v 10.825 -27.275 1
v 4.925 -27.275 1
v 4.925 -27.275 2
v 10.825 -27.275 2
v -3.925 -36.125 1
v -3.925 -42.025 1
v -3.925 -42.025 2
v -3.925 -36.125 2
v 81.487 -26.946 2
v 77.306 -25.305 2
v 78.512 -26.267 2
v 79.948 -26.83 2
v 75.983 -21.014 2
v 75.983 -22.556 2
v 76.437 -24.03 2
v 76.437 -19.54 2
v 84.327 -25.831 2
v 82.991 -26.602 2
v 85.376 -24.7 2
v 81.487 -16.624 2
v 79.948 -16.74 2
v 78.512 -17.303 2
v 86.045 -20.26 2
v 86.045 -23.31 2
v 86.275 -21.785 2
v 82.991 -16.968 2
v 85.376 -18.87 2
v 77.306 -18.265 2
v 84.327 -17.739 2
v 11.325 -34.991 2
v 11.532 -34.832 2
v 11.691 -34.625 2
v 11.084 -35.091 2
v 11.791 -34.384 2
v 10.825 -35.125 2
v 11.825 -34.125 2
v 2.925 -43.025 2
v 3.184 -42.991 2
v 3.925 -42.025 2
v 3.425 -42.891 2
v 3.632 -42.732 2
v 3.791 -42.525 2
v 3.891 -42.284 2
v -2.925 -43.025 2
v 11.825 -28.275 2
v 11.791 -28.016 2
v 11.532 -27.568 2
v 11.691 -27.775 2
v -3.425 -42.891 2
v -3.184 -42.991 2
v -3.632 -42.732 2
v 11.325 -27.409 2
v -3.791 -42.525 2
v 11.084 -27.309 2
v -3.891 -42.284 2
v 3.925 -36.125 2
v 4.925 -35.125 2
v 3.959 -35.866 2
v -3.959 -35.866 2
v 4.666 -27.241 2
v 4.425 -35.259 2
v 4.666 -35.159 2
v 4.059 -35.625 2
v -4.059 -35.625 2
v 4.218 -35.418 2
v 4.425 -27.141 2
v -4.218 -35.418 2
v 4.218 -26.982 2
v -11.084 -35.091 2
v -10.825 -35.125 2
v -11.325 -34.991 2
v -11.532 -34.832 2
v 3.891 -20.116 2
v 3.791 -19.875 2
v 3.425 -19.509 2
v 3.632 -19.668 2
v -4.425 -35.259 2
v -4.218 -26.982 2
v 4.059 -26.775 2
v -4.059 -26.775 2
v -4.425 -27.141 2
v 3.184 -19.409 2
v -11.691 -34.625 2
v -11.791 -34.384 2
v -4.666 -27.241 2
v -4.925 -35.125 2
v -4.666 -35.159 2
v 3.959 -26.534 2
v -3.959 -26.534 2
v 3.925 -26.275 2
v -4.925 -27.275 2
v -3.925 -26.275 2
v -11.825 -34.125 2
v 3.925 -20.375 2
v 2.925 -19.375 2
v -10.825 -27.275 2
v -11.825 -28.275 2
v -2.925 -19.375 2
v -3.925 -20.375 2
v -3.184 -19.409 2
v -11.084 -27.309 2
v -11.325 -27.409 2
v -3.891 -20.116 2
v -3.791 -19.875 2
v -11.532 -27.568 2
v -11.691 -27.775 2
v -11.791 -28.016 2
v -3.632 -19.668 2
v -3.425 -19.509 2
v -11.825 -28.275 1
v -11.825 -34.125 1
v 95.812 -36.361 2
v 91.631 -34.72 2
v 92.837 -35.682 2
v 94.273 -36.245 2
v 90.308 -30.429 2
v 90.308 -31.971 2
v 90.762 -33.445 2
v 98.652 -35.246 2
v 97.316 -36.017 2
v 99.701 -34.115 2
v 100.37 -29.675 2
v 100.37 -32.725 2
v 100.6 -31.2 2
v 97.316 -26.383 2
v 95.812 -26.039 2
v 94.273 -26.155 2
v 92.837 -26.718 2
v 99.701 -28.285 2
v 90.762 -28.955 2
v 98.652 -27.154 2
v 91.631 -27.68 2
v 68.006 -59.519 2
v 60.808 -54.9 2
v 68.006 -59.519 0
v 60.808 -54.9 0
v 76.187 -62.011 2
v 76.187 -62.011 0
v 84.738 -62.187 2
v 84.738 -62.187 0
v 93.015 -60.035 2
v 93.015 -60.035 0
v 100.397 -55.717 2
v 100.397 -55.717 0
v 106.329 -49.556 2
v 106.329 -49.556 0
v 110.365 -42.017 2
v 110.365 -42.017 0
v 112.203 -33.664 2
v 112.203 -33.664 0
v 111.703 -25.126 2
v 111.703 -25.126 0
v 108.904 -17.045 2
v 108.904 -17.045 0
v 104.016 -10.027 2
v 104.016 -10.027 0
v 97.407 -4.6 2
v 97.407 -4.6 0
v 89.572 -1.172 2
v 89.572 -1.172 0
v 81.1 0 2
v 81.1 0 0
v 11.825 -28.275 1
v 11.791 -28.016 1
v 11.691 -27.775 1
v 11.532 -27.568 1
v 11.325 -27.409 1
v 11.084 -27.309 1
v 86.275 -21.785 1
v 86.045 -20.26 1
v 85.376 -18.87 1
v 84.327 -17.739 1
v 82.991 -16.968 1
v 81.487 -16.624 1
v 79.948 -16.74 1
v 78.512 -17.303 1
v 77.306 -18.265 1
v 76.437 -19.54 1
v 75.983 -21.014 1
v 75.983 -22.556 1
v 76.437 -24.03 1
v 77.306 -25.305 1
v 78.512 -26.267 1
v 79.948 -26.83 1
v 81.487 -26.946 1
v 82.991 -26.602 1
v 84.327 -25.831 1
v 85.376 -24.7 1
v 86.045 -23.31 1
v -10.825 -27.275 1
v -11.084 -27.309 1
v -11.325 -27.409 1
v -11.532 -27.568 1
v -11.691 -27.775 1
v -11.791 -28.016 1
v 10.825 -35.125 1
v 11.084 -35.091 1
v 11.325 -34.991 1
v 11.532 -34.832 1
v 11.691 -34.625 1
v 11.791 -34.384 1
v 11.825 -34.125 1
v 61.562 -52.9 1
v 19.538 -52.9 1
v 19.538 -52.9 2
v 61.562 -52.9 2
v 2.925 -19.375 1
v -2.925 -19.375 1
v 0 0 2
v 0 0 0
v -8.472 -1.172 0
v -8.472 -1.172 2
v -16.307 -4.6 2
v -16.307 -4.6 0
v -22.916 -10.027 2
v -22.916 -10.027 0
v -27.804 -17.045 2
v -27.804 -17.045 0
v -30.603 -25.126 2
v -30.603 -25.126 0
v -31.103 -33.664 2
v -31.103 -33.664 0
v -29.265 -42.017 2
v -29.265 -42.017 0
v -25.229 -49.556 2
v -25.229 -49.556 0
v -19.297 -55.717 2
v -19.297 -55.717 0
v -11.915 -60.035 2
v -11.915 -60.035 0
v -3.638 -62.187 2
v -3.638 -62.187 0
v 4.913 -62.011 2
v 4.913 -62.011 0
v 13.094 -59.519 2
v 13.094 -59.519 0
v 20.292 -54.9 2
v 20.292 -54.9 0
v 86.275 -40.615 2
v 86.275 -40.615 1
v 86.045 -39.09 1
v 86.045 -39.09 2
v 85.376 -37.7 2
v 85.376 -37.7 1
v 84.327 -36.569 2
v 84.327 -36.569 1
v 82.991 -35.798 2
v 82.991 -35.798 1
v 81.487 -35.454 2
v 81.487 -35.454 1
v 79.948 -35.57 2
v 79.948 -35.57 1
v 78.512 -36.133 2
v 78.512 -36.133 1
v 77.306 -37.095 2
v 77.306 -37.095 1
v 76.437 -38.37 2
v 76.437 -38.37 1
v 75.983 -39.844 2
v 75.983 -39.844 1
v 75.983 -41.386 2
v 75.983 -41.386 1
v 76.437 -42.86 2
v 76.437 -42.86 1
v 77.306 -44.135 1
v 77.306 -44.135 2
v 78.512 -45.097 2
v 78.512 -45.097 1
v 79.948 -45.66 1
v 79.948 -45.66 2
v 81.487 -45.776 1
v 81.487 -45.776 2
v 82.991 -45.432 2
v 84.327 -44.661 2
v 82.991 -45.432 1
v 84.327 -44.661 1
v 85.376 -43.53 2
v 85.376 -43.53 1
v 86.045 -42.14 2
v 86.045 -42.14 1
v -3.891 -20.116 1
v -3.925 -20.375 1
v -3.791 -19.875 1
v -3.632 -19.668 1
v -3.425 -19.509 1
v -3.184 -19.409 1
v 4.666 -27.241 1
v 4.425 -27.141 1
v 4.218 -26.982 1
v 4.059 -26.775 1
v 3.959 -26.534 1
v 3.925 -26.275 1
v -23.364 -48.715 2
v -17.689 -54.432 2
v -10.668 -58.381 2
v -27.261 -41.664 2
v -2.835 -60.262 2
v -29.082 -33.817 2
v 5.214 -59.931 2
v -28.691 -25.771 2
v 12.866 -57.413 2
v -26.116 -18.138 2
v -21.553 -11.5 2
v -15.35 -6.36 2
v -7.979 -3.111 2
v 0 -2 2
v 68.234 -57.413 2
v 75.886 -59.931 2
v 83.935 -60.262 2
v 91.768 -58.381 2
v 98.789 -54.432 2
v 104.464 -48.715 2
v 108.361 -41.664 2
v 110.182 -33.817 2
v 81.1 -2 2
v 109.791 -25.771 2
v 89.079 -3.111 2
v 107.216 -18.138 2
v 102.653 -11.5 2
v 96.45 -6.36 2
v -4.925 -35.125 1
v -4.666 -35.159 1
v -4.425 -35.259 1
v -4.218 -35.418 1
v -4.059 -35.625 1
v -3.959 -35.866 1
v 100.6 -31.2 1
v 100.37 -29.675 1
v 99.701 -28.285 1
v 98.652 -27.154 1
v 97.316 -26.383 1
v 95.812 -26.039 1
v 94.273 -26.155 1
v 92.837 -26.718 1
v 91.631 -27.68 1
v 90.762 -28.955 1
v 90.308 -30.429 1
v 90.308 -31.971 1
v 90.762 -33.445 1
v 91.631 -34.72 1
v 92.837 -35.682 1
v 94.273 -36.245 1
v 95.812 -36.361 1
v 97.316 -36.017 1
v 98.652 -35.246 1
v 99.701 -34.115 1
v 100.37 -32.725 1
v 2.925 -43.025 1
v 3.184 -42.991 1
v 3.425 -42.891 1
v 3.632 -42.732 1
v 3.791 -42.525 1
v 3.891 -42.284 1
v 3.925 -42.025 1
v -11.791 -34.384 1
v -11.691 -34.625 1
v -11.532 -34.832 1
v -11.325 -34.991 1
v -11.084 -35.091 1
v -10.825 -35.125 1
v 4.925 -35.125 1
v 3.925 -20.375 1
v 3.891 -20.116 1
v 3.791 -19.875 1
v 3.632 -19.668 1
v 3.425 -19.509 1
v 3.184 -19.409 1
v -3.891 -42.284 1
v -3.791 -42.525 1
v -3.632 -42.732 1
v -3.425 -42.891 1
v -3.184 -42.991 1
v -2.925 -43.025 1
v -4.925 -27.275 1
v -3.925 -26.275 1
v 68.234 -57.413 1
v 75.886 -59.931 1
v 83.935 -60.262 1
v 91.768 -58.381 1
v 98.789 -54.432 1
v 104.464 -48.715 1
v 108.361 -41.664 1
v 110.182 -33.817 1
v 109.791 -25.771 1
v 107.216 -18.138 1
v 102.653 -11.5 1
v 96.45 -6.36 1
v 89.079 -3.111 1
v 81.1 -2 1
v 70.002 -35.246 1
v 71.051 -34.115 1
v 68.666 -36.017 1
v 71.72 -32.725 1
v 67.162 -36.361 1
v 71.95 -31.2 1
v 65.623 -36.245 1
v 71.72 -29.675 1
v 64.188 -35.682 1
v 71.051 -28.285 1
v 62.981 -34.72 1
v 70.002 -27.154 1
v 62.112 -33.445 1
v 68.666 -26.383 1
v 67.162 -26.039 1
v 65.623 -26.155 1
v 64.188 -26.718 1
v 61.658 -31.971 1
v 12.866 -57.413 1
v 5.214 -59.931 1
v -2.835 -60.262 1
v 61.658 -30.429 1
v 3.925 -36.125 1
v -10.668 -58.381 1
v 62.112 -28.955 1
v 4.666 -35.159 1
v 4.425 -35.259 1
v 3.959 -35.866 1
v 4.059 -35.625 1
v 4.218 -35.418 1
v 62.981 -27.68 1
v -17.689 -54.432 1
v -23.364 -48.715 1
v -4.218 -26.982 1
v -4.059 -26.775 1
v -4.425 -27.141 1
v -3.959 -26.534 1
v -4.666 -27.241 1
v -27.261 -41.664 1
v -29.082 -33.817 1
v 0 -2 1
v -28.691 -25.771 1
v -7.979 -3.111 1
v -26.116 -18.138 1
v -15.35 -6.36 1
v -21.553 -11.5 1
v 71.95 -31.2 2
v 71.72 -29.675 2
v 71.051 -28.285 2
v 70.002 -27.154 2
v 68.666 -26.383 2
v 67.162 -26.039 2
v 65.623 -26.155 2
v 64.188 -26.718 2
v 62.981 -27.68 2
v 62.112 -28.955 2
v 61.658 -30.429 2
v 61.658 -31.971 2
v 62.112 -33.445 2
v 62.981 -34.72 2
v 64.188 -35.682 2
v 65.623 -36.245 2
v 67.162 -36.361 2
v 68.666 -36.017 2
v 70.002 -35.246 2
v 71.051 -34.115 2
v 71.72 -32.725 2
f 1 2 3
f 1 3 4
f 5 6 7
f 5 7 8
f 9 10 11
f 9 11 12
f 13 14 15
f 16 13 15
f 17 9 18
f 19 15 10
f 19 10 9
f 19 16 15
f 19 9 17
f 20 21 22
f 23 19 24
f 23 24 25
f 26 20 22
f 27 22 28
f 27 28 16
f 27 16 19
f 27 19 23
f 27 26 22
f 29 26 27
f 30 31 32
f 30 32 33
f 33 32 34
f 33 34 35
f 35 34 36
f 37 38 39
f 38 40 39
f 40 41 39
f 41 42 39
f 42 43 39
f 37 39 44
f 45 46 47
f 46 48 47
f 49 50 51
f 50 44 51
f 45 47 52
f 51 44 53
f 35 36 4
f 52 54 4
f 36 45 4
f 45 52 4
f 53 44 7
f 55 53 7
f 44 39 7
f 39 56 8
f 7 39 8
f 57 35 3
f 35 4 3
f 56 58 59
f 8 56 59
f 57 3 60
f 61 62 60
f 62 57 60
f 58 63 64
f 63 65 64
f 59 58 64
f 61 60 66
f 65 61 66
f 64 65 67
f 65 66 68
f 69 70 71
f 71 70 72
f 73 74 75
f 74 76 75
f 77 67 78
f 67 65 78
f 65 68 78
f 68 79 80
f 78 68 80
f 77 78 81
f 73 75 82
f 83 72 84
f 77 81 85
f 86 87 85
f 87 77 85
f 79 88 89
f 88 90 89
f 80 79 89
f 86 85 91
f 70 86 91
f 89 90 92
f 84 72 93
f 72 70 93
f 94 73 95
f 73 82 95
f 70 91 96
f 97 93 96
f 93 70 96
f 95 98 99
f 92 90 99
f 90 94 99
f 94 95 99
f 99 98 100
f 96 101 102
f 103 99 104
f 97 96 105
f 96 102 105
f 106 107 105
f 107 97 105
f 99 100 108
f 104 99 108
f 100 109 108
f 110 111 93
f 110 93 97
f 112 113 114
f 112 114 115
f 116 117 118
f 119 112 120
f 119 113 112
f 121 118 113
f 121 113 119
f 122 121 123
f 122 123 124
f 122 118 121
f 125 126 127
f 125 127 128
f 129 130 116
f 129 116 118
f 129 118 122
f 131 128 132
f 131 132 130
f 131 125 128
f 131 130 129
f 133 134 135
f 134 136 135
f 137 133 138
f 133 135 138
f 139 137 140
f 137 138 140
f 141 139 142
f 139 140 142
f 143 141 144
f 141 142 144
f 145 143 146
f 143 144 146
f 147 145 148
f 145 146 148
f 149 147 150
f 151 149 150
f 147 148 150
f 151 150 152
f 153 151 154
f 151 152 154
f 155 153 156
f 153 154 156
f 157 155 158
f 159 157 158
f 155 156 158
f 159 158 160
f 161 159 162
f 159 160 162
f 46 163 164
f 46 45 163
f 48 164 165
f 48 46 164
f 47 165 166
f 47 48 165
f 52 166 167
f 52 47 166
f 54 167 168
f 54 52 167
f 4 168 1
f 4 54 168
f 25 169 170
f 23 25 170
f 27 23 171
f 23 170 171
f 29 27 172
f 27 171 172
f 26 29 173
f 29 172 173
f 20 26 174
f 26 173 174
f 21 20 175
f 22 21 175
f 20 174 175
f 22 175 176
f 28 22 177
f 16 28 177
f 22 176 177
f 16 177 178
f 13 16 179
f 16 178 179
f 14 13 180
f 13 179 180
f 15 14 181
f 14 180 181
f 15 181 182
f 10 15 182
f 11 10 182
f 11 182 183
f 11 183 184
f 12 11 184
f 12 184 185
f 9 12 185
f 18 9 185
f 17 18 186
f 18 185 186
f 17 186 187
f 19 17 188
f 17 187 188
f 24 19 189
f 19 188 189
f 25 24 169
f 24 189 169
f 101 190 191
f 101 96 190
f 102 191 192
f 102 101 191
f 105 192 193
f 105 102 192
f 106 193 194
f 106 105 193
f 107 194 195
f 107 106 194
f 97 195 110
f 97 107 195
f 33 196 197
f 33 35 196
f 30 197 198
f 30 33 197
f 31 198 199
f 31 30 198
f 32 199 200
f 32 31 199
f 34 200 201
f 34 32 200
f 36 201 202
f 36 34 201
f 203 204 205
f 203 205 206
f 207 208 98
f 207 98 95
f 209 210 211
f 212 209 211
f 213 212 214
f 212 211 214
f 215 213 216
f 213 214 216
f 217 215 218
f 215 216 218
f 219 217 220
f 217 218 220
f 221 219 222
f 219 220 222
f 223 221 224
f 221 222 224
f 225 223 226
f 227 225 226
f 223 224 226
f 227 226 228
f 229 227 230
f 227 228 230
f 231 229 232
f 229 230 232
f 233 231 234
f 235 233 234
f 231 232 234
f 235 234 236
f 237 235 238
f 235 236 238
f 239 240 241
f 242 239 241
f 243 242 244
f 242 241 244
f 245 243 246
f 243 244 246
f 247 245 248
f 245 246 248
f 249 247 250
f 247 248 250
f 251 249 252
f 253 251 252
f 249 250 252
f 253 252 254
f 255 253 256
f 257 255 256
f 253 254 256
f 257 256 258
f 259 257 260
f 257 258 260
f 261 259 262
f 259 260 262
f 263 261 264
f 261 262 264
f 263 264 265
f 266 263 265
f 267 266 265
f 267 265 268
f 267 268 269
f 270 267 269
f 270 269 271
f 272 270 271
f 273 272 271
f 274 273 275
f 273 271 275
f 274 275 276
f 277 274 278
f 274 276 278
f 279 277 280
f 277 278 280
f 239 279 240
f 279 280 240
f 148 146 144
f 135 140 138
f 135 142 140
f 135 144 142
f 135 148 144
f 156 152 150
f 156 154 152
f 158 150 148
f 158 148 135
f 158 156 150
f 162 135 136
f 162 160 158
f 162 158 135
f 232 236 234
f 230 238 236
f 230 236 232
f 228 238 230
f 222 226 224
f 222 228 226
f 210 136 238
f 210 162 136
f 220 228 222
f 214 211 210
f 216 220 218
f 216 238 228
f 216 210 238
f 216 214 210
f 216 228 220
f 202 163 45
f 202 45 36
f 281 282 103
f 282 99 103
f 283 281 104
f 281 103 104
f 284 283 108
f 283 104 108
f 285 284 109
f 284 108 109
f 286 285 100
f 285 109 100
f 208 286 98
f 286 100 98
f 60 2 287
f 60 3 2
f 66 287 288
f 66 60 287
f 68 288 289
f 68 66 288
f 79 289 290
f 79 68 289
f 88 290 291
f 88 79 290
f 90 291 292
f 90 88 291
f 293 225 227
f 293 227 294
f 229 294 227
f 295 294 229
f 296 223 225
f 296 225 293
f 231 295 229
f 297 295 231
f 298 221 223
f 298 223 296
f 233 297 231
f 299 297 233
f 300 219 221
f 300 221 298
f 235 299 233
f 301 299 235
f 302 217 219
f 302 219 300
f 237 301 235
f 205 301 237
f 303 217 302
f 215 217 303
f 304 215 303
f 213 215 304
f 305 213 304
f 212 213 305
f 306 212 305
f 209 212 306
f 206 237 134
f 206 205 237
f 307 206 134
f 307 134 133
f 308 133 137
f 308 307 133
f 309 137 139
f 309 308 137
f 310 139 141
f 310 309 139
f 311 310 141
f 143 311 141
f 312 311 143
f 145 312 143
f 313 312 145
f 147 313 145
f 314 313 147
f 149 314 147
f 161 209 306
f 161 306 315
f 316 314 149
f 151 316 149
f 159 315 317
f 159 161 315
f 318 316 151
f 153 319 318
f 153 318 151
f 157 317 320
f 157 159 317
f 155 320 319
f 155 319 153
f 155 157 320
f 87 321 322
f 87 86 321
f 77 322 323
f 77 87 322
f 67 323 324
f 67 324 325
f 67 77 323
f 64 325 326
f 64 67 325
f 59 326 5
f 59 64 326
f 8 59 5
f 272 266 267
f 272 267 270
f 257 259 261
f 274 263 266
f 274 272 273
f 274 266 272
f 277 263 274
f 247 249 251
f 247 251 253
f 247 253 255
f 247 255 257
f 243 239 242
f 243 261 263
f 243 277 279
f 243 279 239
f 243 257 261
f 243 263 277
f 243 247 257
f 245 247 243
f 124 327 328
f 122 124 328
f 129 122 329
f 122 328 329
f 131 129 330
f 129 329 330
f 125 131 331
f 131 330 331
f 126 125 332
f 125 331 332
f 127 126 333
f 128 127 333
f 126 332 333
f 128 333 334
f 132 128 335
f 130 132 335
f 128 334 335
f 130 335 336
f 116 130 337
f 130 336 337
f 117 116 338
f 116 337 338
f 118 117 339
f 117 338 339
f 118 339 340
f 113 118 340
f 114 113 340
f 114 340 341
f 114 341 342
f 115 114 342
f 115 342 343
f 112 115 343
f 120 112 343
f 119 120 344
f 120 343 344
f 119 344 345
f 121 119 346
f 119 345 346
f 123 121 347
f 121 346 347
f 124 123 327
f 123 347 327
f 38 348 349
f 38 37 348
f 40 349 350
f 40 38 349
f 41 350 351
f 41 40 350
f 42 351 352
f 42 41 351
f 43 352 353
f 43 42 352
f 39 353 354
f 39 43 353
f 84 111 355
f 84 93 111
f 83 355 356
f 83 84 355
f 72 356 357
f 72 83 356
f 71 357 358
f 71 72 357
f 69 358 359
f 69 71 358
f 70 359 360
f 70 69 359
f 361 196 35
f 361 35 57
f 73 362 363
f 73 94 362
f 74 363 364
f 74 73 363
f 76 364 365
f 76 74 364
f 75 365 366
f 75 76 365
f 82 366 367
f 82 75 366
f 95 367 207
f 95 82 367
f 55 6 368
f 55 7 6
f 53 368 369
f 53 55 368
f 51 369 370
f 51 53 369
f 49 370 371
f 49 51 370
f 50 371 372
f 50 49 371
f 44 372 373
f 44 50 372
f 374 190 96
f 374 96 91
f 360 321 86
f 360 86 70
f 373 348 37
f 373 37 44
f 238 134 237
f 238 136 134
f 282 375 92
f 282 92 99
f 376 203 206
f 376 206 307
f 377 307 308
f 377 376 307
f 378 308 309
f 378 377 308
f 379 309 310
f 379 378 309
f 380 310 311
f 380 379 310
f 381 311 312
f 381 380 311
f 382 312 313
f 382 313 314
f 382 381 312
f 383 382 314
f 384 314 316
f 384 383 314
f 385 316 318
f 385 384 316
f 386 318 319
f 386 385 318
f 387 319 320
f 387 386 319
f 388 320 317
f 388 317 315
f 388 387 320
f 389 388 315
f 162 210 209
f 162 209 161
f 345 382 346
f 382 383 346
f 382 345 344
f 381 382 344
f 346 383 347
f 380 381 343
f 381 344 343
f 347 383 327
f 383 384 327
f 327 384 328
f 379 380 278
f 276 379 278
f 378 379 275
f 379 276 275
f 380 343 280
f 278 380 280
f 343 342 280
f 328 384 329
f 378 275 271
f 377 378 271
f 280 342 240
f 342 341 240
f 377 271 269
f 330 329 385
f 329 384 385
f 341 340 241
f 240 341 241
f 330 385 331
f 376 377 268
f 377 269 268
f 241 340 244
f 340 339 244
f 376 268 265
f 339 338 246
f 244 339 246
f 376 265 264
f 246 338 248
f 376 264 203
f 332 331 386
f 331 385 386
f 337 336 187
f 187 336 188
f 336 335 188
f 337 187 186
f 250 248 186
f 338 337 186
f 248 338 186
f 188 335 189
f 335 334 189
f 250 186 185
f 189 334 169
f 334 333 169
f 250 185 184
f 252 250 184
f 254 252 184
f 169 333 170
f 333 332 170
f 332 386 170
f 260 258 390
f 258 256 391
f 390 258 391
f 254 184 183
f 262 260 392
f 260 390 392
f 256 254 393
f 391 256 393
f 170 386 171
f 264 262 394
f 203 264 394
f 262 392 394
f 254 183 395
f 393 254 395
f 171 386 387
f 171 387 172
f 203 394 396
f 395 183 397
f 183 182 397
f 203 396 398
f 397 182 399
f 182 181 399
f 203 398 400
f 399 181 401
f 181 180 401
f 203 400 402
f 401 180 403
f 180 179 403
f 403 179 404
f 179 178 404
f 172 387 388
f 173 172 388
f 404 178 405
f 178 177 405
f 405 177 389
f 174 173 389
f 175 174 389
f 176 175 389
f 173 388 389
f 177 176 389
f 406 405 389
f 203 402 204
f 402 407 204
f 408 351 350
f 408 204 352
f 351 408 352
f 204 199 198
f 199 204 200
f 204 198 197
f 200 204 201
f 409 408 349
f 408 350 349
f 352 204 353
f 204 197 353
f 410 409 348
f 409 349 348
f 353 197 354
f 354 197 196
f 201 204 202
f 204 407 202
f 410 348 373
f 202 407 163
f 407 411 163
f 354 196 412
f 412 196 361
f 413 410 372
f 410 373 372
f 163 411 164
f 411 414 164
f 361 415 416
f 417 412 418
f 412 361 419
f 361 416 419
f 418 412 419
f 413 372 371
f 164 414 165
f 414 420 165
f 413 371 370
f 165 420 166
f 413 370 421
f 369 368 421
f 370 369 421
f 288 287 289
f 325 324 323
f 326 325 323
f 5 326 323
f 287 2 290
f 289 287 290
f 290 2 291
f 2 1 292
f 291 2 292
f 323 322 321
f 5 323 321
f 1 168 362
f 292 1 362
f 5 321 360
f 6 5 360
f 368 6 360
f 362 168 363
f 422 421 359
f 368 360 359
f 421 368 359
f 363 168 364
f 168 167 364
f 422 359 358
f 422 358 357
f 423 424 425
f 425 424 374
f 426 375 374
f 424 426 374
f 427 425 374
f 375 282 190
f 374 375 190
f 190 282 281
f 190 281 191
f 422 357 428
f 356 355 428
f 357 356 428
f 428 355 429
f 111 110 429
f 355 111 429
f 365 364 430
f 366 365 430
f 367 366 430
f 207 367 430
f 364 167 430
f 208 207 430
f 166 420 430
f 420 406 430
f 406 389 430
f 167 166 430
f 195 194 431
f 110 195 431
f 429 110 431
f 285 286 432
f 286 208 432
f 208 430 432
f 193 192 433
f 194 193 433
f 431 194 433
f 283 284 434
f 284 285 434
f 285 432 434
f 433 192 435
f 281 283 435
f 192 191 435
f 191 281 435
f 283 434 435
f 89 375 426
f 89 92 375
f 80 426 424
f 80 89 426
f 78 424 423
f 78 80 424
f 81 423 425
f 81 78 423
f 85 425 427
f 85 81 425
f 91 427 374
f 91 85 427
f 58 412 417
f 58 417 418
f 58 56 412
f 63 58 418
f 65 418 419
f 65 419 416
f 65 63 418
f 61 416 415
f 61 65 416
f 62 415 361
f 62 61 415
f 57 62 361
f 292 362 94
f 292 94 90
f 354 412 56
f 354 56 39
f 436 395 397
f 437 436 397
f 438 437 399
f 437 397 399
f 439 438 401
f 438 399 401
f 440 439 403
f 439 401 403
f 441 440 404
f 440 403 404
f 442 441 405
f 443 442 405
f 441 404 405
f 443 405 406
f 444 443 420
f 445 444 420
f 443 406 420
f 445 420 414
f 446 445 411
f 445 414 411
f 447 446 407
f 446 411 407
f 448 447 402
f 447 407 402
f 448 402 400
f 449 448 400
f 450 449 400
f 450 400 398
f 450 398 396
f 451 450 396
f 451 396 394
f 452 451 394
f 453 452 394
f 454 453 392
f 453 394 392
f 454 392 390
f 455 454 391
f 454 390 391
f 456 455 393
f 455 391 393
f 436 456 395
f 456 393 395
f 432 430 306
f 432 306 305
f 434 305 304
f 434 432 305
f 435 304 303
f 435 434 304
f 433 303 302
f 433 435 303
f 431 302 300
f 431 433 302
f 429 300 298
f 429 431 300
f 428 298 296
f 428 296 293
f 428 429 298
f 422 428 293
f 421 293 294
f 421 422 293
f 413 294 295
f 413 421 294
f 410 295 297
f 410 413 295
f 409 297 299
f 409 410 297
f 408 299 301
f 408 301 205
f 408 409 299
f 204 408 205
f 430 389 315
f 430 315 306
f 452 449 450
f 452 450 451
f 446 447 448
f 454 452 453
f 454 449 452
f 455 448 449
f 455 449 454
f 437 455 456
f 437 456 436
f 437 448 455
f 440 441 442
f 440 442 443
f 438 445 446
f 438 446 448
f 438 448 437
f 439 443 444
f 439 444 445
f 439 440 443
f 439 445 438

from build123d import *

# Parameters (mm, degrees)
PAD_DEPTH    = 1
SKETCH001_R  = 5.175
PAD001_DEPTH = 1
FILLET_R     = 1


with BuildPart() as part:
    # Sketch → Pad (new body)
    with BuildSketch(Plane.XY):
        with BuildLine():
            Line((0, 0), (81.1, 0))
            ThreePointArc((60.808376, -54.9), (110.364996, -42.016654), (81.1, 0))
            Line((20.291624, -54.9), (60.808376, -54.9))
            ThreePointArc((0, 0), (-29.264996, -42.016654), (20.291624, -54.9))
        make_face()
    extrude(amount=PAD_DEPTH)

    # Sketch001 (on Face6 of Pad) → Pad001 (join)
    with BuildSketch(Plane.XY.offset(1)):
        with BuildLine():
            ThreePointArc((0, 0), (-29.264996, -42.016654), (20.291624, -54.9))
            Line((60.808376, -54.9), (20.291624, -54.9))
            ThreePointArc((60.808376, -54.9), (110.364996, -42.016654), (81.1, 0))
            Line((0, 0), (81.1, 0))
        make_face()
        with BuildLine():
            ThreePointArc((0, -2), (-27.260594, -41.664225), (19.538424, -52.9))
            Line((19.538424, -52.9), (61.561576, -52.9))
            ThreePointArc((61.561576, -52.9), (108.360594, -41.664225), (81.1, -2))
            Line((81.1, -2), (0, -2))
        make_face(mode=Mode.SUBTRACT)
        with Locations((81.1, -21.785)):
            Circle(SKETCH001_R)
        with Locations((95.425, -31.2)):
            Circle(SKETCH001_R)
        with Locations((81.1, -40.615)):
            Circle(SKETCH001_R)
        with Locations((66.775, -31.2)):
            Circle(SKETCH001_R)
        Polygon((-3.925, -19.375), (3.925, -19.375), (3.925, -27.275), (11.825, -27.275), (11.825, -35.125), (3.925, -35.125), (3.925, -43.025), (-3.925, -43.025), (-3.925, -35.125), (-11.825, -35.125), (-11.825, -27.275), (-3.925, -27.275), align=None)
    extrude(amount=PAD001_DEPTH)

    # Fillet
    fillet_edges = [part.edges().sort_by_distance(p)[0] for p in [
        (3.925, -35.125, 1.5),
        (3.925, -43.025, 1.5),
        (11.825, -35.125, 1.5),
        (11.825, -27.275, 1.5),
        (3.925, -19.375, 1.5),
        (-3.925, -43.025, 1.5),
        (-3.925, -35.125, 1.5),
        (-11.825, -35.125, 1.5),
        (-11.825, -27.275, 1.5),
        (-3.925, -27.275, 1.5),
        (-3.925, -19.375, 1.5),
        (3.925, -27.275, 1.5),
    ]]
    fillet(fillet_edges, radius=FILLET_R)


solid = part.part
